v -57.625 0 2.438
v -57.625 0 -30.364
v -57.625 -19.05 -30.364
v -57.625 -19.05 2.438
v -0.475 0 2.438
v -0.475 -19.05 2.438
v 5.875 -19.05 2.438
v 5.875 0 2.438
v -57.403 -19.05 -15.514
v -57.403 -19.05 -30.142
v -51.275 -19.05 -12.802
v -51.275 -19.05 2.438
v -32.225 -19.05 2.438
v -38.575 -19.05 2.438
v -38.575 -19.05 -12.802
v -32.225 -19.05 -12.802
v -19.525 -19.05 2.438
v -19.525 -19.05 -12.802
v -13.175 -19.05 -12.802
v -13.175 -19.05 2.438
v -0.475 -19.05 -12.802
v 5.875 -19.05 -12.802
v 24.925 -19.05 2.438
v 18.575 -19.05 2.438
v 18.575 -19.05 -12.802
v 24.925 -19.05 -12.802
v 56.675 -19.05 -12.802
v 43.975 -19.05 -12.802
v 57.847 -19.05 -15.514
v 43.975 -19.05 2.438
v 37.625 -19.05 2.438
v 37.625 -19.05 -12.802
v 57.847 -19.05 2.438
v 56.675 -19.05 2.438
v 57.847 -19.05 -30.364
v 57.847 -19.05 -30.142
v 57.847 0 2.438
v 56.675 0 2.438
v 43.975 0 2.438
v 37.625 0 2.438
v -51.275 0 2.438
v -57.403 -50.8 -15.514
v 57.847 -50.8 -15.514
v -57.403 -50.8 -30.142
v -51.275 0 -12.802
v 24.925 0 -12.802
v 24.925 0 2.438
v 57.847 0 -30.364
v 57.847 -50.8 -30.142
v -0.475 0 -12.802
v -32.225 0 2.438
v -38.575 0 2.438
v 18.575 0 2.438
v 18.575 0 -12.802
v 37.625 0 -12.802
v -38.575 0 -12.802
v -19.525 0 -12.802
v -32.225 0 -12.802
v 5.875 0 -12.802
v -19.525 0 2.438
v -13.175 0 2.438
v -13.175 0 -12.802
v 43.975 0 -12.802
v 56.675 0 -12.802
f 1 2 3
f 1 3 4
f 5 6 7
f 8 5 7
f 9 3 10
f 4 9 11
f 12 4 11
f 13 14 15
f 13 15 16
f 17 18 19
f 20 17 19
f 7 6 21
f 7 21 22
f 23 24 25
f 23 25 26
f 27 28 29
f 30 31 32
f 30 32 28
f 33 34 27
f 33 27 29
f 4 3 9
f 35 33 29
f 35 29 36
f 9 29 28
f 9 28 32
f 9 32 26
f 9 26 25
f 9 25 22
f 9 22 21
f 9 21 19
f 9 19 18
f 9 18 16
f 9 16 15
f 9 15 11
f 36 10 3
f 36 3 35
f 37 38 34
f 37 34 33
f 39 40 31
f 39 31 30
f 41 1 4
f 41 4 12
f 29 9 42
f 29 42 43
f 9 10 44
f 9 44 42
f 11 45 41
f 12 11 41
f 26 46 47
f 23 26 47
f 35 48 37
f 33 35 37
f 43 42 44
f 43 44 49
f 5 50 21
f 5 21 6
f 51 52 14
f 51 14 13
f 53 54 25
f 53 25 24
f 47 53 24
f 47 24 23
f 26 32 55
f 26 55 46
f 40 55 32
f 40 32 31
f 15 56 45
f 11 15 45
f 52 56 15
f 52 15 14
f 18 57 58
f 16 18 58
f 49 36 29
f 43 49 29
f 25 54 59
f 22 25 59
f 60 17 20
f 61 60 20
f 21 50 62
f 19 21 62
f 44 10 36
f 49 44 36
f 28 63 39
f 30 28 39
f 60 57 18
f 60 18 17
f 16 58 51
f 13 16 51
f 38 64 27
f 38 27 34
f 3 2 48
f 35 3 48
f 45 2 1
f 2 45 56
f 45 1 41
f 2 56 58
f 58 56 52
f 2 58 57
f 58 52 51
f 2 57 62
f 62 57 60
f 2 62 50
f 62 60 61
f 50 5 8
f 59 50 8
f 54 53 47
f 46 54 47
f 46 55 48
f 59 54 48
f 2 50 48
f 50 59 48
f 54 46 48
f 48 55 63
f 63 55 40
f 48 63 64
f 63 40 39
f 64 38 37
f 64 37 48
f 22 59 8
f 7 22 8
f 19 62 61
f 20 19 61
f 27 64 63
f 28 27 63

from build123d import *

# Parameters (mm, degrees)
F0_W     = 115.471501
F0_H     = 32.801882
F1_DEPTH = 19.05
F2_W     = 115.249865
F2_H     = 14.627867
F3_DEPTH = 50.8
F4_W     = 12.7
F4_H     = 15.24
F5_DEPTH = 19.05


with BuildPart() as f1:
    # F0 (on Front) → F1 (new body)
    with BuildSketch(Plane.XZ):
        with Locations((0.110819, -13.962963)):
            Rectangle(F0_W, F0_H)
    extrude(amount=F1_DEPTH)

    # F2 (on Front) → F3 (join)
    with BuildSketch(Plane.XZ):
        with Locations((0.221636, -22.828339)):
            Rectangle(F2_W, F2_H)
    extrude(amount=F3_DEPTH)

    # F4 (on face) → F5 (cut)
    with BuildSketch(Plane(origin=(0, 0, 0), x_dir=(-1, 0, 0), z_dir=(0, 1, 0))):
        with Locations((44.924932, -5.182022)):
            Rectangle(F4_W, F4_H)
        with Locations((25.874932, -5.182022)):
            Rectangle(F4_W, F4_H)
        with Locations((6.824932, -5.182022)):
            Rectangle(F4_W, F4_H)
        with Locations((-12.225068, -5.182022)):
            Rectangle(F4_W, F4_H)
        with Locations((-31.275068, -5.182022)):
            Rectangle(F4_W, F4_H)
        with Locations((-50.325068, -5.182022)):
            Rectangle(F4_W, F4_H)
    extrude(amount=-F5_DEPTH, mode=Mode.SUBTRACT)


solid = f1.part
